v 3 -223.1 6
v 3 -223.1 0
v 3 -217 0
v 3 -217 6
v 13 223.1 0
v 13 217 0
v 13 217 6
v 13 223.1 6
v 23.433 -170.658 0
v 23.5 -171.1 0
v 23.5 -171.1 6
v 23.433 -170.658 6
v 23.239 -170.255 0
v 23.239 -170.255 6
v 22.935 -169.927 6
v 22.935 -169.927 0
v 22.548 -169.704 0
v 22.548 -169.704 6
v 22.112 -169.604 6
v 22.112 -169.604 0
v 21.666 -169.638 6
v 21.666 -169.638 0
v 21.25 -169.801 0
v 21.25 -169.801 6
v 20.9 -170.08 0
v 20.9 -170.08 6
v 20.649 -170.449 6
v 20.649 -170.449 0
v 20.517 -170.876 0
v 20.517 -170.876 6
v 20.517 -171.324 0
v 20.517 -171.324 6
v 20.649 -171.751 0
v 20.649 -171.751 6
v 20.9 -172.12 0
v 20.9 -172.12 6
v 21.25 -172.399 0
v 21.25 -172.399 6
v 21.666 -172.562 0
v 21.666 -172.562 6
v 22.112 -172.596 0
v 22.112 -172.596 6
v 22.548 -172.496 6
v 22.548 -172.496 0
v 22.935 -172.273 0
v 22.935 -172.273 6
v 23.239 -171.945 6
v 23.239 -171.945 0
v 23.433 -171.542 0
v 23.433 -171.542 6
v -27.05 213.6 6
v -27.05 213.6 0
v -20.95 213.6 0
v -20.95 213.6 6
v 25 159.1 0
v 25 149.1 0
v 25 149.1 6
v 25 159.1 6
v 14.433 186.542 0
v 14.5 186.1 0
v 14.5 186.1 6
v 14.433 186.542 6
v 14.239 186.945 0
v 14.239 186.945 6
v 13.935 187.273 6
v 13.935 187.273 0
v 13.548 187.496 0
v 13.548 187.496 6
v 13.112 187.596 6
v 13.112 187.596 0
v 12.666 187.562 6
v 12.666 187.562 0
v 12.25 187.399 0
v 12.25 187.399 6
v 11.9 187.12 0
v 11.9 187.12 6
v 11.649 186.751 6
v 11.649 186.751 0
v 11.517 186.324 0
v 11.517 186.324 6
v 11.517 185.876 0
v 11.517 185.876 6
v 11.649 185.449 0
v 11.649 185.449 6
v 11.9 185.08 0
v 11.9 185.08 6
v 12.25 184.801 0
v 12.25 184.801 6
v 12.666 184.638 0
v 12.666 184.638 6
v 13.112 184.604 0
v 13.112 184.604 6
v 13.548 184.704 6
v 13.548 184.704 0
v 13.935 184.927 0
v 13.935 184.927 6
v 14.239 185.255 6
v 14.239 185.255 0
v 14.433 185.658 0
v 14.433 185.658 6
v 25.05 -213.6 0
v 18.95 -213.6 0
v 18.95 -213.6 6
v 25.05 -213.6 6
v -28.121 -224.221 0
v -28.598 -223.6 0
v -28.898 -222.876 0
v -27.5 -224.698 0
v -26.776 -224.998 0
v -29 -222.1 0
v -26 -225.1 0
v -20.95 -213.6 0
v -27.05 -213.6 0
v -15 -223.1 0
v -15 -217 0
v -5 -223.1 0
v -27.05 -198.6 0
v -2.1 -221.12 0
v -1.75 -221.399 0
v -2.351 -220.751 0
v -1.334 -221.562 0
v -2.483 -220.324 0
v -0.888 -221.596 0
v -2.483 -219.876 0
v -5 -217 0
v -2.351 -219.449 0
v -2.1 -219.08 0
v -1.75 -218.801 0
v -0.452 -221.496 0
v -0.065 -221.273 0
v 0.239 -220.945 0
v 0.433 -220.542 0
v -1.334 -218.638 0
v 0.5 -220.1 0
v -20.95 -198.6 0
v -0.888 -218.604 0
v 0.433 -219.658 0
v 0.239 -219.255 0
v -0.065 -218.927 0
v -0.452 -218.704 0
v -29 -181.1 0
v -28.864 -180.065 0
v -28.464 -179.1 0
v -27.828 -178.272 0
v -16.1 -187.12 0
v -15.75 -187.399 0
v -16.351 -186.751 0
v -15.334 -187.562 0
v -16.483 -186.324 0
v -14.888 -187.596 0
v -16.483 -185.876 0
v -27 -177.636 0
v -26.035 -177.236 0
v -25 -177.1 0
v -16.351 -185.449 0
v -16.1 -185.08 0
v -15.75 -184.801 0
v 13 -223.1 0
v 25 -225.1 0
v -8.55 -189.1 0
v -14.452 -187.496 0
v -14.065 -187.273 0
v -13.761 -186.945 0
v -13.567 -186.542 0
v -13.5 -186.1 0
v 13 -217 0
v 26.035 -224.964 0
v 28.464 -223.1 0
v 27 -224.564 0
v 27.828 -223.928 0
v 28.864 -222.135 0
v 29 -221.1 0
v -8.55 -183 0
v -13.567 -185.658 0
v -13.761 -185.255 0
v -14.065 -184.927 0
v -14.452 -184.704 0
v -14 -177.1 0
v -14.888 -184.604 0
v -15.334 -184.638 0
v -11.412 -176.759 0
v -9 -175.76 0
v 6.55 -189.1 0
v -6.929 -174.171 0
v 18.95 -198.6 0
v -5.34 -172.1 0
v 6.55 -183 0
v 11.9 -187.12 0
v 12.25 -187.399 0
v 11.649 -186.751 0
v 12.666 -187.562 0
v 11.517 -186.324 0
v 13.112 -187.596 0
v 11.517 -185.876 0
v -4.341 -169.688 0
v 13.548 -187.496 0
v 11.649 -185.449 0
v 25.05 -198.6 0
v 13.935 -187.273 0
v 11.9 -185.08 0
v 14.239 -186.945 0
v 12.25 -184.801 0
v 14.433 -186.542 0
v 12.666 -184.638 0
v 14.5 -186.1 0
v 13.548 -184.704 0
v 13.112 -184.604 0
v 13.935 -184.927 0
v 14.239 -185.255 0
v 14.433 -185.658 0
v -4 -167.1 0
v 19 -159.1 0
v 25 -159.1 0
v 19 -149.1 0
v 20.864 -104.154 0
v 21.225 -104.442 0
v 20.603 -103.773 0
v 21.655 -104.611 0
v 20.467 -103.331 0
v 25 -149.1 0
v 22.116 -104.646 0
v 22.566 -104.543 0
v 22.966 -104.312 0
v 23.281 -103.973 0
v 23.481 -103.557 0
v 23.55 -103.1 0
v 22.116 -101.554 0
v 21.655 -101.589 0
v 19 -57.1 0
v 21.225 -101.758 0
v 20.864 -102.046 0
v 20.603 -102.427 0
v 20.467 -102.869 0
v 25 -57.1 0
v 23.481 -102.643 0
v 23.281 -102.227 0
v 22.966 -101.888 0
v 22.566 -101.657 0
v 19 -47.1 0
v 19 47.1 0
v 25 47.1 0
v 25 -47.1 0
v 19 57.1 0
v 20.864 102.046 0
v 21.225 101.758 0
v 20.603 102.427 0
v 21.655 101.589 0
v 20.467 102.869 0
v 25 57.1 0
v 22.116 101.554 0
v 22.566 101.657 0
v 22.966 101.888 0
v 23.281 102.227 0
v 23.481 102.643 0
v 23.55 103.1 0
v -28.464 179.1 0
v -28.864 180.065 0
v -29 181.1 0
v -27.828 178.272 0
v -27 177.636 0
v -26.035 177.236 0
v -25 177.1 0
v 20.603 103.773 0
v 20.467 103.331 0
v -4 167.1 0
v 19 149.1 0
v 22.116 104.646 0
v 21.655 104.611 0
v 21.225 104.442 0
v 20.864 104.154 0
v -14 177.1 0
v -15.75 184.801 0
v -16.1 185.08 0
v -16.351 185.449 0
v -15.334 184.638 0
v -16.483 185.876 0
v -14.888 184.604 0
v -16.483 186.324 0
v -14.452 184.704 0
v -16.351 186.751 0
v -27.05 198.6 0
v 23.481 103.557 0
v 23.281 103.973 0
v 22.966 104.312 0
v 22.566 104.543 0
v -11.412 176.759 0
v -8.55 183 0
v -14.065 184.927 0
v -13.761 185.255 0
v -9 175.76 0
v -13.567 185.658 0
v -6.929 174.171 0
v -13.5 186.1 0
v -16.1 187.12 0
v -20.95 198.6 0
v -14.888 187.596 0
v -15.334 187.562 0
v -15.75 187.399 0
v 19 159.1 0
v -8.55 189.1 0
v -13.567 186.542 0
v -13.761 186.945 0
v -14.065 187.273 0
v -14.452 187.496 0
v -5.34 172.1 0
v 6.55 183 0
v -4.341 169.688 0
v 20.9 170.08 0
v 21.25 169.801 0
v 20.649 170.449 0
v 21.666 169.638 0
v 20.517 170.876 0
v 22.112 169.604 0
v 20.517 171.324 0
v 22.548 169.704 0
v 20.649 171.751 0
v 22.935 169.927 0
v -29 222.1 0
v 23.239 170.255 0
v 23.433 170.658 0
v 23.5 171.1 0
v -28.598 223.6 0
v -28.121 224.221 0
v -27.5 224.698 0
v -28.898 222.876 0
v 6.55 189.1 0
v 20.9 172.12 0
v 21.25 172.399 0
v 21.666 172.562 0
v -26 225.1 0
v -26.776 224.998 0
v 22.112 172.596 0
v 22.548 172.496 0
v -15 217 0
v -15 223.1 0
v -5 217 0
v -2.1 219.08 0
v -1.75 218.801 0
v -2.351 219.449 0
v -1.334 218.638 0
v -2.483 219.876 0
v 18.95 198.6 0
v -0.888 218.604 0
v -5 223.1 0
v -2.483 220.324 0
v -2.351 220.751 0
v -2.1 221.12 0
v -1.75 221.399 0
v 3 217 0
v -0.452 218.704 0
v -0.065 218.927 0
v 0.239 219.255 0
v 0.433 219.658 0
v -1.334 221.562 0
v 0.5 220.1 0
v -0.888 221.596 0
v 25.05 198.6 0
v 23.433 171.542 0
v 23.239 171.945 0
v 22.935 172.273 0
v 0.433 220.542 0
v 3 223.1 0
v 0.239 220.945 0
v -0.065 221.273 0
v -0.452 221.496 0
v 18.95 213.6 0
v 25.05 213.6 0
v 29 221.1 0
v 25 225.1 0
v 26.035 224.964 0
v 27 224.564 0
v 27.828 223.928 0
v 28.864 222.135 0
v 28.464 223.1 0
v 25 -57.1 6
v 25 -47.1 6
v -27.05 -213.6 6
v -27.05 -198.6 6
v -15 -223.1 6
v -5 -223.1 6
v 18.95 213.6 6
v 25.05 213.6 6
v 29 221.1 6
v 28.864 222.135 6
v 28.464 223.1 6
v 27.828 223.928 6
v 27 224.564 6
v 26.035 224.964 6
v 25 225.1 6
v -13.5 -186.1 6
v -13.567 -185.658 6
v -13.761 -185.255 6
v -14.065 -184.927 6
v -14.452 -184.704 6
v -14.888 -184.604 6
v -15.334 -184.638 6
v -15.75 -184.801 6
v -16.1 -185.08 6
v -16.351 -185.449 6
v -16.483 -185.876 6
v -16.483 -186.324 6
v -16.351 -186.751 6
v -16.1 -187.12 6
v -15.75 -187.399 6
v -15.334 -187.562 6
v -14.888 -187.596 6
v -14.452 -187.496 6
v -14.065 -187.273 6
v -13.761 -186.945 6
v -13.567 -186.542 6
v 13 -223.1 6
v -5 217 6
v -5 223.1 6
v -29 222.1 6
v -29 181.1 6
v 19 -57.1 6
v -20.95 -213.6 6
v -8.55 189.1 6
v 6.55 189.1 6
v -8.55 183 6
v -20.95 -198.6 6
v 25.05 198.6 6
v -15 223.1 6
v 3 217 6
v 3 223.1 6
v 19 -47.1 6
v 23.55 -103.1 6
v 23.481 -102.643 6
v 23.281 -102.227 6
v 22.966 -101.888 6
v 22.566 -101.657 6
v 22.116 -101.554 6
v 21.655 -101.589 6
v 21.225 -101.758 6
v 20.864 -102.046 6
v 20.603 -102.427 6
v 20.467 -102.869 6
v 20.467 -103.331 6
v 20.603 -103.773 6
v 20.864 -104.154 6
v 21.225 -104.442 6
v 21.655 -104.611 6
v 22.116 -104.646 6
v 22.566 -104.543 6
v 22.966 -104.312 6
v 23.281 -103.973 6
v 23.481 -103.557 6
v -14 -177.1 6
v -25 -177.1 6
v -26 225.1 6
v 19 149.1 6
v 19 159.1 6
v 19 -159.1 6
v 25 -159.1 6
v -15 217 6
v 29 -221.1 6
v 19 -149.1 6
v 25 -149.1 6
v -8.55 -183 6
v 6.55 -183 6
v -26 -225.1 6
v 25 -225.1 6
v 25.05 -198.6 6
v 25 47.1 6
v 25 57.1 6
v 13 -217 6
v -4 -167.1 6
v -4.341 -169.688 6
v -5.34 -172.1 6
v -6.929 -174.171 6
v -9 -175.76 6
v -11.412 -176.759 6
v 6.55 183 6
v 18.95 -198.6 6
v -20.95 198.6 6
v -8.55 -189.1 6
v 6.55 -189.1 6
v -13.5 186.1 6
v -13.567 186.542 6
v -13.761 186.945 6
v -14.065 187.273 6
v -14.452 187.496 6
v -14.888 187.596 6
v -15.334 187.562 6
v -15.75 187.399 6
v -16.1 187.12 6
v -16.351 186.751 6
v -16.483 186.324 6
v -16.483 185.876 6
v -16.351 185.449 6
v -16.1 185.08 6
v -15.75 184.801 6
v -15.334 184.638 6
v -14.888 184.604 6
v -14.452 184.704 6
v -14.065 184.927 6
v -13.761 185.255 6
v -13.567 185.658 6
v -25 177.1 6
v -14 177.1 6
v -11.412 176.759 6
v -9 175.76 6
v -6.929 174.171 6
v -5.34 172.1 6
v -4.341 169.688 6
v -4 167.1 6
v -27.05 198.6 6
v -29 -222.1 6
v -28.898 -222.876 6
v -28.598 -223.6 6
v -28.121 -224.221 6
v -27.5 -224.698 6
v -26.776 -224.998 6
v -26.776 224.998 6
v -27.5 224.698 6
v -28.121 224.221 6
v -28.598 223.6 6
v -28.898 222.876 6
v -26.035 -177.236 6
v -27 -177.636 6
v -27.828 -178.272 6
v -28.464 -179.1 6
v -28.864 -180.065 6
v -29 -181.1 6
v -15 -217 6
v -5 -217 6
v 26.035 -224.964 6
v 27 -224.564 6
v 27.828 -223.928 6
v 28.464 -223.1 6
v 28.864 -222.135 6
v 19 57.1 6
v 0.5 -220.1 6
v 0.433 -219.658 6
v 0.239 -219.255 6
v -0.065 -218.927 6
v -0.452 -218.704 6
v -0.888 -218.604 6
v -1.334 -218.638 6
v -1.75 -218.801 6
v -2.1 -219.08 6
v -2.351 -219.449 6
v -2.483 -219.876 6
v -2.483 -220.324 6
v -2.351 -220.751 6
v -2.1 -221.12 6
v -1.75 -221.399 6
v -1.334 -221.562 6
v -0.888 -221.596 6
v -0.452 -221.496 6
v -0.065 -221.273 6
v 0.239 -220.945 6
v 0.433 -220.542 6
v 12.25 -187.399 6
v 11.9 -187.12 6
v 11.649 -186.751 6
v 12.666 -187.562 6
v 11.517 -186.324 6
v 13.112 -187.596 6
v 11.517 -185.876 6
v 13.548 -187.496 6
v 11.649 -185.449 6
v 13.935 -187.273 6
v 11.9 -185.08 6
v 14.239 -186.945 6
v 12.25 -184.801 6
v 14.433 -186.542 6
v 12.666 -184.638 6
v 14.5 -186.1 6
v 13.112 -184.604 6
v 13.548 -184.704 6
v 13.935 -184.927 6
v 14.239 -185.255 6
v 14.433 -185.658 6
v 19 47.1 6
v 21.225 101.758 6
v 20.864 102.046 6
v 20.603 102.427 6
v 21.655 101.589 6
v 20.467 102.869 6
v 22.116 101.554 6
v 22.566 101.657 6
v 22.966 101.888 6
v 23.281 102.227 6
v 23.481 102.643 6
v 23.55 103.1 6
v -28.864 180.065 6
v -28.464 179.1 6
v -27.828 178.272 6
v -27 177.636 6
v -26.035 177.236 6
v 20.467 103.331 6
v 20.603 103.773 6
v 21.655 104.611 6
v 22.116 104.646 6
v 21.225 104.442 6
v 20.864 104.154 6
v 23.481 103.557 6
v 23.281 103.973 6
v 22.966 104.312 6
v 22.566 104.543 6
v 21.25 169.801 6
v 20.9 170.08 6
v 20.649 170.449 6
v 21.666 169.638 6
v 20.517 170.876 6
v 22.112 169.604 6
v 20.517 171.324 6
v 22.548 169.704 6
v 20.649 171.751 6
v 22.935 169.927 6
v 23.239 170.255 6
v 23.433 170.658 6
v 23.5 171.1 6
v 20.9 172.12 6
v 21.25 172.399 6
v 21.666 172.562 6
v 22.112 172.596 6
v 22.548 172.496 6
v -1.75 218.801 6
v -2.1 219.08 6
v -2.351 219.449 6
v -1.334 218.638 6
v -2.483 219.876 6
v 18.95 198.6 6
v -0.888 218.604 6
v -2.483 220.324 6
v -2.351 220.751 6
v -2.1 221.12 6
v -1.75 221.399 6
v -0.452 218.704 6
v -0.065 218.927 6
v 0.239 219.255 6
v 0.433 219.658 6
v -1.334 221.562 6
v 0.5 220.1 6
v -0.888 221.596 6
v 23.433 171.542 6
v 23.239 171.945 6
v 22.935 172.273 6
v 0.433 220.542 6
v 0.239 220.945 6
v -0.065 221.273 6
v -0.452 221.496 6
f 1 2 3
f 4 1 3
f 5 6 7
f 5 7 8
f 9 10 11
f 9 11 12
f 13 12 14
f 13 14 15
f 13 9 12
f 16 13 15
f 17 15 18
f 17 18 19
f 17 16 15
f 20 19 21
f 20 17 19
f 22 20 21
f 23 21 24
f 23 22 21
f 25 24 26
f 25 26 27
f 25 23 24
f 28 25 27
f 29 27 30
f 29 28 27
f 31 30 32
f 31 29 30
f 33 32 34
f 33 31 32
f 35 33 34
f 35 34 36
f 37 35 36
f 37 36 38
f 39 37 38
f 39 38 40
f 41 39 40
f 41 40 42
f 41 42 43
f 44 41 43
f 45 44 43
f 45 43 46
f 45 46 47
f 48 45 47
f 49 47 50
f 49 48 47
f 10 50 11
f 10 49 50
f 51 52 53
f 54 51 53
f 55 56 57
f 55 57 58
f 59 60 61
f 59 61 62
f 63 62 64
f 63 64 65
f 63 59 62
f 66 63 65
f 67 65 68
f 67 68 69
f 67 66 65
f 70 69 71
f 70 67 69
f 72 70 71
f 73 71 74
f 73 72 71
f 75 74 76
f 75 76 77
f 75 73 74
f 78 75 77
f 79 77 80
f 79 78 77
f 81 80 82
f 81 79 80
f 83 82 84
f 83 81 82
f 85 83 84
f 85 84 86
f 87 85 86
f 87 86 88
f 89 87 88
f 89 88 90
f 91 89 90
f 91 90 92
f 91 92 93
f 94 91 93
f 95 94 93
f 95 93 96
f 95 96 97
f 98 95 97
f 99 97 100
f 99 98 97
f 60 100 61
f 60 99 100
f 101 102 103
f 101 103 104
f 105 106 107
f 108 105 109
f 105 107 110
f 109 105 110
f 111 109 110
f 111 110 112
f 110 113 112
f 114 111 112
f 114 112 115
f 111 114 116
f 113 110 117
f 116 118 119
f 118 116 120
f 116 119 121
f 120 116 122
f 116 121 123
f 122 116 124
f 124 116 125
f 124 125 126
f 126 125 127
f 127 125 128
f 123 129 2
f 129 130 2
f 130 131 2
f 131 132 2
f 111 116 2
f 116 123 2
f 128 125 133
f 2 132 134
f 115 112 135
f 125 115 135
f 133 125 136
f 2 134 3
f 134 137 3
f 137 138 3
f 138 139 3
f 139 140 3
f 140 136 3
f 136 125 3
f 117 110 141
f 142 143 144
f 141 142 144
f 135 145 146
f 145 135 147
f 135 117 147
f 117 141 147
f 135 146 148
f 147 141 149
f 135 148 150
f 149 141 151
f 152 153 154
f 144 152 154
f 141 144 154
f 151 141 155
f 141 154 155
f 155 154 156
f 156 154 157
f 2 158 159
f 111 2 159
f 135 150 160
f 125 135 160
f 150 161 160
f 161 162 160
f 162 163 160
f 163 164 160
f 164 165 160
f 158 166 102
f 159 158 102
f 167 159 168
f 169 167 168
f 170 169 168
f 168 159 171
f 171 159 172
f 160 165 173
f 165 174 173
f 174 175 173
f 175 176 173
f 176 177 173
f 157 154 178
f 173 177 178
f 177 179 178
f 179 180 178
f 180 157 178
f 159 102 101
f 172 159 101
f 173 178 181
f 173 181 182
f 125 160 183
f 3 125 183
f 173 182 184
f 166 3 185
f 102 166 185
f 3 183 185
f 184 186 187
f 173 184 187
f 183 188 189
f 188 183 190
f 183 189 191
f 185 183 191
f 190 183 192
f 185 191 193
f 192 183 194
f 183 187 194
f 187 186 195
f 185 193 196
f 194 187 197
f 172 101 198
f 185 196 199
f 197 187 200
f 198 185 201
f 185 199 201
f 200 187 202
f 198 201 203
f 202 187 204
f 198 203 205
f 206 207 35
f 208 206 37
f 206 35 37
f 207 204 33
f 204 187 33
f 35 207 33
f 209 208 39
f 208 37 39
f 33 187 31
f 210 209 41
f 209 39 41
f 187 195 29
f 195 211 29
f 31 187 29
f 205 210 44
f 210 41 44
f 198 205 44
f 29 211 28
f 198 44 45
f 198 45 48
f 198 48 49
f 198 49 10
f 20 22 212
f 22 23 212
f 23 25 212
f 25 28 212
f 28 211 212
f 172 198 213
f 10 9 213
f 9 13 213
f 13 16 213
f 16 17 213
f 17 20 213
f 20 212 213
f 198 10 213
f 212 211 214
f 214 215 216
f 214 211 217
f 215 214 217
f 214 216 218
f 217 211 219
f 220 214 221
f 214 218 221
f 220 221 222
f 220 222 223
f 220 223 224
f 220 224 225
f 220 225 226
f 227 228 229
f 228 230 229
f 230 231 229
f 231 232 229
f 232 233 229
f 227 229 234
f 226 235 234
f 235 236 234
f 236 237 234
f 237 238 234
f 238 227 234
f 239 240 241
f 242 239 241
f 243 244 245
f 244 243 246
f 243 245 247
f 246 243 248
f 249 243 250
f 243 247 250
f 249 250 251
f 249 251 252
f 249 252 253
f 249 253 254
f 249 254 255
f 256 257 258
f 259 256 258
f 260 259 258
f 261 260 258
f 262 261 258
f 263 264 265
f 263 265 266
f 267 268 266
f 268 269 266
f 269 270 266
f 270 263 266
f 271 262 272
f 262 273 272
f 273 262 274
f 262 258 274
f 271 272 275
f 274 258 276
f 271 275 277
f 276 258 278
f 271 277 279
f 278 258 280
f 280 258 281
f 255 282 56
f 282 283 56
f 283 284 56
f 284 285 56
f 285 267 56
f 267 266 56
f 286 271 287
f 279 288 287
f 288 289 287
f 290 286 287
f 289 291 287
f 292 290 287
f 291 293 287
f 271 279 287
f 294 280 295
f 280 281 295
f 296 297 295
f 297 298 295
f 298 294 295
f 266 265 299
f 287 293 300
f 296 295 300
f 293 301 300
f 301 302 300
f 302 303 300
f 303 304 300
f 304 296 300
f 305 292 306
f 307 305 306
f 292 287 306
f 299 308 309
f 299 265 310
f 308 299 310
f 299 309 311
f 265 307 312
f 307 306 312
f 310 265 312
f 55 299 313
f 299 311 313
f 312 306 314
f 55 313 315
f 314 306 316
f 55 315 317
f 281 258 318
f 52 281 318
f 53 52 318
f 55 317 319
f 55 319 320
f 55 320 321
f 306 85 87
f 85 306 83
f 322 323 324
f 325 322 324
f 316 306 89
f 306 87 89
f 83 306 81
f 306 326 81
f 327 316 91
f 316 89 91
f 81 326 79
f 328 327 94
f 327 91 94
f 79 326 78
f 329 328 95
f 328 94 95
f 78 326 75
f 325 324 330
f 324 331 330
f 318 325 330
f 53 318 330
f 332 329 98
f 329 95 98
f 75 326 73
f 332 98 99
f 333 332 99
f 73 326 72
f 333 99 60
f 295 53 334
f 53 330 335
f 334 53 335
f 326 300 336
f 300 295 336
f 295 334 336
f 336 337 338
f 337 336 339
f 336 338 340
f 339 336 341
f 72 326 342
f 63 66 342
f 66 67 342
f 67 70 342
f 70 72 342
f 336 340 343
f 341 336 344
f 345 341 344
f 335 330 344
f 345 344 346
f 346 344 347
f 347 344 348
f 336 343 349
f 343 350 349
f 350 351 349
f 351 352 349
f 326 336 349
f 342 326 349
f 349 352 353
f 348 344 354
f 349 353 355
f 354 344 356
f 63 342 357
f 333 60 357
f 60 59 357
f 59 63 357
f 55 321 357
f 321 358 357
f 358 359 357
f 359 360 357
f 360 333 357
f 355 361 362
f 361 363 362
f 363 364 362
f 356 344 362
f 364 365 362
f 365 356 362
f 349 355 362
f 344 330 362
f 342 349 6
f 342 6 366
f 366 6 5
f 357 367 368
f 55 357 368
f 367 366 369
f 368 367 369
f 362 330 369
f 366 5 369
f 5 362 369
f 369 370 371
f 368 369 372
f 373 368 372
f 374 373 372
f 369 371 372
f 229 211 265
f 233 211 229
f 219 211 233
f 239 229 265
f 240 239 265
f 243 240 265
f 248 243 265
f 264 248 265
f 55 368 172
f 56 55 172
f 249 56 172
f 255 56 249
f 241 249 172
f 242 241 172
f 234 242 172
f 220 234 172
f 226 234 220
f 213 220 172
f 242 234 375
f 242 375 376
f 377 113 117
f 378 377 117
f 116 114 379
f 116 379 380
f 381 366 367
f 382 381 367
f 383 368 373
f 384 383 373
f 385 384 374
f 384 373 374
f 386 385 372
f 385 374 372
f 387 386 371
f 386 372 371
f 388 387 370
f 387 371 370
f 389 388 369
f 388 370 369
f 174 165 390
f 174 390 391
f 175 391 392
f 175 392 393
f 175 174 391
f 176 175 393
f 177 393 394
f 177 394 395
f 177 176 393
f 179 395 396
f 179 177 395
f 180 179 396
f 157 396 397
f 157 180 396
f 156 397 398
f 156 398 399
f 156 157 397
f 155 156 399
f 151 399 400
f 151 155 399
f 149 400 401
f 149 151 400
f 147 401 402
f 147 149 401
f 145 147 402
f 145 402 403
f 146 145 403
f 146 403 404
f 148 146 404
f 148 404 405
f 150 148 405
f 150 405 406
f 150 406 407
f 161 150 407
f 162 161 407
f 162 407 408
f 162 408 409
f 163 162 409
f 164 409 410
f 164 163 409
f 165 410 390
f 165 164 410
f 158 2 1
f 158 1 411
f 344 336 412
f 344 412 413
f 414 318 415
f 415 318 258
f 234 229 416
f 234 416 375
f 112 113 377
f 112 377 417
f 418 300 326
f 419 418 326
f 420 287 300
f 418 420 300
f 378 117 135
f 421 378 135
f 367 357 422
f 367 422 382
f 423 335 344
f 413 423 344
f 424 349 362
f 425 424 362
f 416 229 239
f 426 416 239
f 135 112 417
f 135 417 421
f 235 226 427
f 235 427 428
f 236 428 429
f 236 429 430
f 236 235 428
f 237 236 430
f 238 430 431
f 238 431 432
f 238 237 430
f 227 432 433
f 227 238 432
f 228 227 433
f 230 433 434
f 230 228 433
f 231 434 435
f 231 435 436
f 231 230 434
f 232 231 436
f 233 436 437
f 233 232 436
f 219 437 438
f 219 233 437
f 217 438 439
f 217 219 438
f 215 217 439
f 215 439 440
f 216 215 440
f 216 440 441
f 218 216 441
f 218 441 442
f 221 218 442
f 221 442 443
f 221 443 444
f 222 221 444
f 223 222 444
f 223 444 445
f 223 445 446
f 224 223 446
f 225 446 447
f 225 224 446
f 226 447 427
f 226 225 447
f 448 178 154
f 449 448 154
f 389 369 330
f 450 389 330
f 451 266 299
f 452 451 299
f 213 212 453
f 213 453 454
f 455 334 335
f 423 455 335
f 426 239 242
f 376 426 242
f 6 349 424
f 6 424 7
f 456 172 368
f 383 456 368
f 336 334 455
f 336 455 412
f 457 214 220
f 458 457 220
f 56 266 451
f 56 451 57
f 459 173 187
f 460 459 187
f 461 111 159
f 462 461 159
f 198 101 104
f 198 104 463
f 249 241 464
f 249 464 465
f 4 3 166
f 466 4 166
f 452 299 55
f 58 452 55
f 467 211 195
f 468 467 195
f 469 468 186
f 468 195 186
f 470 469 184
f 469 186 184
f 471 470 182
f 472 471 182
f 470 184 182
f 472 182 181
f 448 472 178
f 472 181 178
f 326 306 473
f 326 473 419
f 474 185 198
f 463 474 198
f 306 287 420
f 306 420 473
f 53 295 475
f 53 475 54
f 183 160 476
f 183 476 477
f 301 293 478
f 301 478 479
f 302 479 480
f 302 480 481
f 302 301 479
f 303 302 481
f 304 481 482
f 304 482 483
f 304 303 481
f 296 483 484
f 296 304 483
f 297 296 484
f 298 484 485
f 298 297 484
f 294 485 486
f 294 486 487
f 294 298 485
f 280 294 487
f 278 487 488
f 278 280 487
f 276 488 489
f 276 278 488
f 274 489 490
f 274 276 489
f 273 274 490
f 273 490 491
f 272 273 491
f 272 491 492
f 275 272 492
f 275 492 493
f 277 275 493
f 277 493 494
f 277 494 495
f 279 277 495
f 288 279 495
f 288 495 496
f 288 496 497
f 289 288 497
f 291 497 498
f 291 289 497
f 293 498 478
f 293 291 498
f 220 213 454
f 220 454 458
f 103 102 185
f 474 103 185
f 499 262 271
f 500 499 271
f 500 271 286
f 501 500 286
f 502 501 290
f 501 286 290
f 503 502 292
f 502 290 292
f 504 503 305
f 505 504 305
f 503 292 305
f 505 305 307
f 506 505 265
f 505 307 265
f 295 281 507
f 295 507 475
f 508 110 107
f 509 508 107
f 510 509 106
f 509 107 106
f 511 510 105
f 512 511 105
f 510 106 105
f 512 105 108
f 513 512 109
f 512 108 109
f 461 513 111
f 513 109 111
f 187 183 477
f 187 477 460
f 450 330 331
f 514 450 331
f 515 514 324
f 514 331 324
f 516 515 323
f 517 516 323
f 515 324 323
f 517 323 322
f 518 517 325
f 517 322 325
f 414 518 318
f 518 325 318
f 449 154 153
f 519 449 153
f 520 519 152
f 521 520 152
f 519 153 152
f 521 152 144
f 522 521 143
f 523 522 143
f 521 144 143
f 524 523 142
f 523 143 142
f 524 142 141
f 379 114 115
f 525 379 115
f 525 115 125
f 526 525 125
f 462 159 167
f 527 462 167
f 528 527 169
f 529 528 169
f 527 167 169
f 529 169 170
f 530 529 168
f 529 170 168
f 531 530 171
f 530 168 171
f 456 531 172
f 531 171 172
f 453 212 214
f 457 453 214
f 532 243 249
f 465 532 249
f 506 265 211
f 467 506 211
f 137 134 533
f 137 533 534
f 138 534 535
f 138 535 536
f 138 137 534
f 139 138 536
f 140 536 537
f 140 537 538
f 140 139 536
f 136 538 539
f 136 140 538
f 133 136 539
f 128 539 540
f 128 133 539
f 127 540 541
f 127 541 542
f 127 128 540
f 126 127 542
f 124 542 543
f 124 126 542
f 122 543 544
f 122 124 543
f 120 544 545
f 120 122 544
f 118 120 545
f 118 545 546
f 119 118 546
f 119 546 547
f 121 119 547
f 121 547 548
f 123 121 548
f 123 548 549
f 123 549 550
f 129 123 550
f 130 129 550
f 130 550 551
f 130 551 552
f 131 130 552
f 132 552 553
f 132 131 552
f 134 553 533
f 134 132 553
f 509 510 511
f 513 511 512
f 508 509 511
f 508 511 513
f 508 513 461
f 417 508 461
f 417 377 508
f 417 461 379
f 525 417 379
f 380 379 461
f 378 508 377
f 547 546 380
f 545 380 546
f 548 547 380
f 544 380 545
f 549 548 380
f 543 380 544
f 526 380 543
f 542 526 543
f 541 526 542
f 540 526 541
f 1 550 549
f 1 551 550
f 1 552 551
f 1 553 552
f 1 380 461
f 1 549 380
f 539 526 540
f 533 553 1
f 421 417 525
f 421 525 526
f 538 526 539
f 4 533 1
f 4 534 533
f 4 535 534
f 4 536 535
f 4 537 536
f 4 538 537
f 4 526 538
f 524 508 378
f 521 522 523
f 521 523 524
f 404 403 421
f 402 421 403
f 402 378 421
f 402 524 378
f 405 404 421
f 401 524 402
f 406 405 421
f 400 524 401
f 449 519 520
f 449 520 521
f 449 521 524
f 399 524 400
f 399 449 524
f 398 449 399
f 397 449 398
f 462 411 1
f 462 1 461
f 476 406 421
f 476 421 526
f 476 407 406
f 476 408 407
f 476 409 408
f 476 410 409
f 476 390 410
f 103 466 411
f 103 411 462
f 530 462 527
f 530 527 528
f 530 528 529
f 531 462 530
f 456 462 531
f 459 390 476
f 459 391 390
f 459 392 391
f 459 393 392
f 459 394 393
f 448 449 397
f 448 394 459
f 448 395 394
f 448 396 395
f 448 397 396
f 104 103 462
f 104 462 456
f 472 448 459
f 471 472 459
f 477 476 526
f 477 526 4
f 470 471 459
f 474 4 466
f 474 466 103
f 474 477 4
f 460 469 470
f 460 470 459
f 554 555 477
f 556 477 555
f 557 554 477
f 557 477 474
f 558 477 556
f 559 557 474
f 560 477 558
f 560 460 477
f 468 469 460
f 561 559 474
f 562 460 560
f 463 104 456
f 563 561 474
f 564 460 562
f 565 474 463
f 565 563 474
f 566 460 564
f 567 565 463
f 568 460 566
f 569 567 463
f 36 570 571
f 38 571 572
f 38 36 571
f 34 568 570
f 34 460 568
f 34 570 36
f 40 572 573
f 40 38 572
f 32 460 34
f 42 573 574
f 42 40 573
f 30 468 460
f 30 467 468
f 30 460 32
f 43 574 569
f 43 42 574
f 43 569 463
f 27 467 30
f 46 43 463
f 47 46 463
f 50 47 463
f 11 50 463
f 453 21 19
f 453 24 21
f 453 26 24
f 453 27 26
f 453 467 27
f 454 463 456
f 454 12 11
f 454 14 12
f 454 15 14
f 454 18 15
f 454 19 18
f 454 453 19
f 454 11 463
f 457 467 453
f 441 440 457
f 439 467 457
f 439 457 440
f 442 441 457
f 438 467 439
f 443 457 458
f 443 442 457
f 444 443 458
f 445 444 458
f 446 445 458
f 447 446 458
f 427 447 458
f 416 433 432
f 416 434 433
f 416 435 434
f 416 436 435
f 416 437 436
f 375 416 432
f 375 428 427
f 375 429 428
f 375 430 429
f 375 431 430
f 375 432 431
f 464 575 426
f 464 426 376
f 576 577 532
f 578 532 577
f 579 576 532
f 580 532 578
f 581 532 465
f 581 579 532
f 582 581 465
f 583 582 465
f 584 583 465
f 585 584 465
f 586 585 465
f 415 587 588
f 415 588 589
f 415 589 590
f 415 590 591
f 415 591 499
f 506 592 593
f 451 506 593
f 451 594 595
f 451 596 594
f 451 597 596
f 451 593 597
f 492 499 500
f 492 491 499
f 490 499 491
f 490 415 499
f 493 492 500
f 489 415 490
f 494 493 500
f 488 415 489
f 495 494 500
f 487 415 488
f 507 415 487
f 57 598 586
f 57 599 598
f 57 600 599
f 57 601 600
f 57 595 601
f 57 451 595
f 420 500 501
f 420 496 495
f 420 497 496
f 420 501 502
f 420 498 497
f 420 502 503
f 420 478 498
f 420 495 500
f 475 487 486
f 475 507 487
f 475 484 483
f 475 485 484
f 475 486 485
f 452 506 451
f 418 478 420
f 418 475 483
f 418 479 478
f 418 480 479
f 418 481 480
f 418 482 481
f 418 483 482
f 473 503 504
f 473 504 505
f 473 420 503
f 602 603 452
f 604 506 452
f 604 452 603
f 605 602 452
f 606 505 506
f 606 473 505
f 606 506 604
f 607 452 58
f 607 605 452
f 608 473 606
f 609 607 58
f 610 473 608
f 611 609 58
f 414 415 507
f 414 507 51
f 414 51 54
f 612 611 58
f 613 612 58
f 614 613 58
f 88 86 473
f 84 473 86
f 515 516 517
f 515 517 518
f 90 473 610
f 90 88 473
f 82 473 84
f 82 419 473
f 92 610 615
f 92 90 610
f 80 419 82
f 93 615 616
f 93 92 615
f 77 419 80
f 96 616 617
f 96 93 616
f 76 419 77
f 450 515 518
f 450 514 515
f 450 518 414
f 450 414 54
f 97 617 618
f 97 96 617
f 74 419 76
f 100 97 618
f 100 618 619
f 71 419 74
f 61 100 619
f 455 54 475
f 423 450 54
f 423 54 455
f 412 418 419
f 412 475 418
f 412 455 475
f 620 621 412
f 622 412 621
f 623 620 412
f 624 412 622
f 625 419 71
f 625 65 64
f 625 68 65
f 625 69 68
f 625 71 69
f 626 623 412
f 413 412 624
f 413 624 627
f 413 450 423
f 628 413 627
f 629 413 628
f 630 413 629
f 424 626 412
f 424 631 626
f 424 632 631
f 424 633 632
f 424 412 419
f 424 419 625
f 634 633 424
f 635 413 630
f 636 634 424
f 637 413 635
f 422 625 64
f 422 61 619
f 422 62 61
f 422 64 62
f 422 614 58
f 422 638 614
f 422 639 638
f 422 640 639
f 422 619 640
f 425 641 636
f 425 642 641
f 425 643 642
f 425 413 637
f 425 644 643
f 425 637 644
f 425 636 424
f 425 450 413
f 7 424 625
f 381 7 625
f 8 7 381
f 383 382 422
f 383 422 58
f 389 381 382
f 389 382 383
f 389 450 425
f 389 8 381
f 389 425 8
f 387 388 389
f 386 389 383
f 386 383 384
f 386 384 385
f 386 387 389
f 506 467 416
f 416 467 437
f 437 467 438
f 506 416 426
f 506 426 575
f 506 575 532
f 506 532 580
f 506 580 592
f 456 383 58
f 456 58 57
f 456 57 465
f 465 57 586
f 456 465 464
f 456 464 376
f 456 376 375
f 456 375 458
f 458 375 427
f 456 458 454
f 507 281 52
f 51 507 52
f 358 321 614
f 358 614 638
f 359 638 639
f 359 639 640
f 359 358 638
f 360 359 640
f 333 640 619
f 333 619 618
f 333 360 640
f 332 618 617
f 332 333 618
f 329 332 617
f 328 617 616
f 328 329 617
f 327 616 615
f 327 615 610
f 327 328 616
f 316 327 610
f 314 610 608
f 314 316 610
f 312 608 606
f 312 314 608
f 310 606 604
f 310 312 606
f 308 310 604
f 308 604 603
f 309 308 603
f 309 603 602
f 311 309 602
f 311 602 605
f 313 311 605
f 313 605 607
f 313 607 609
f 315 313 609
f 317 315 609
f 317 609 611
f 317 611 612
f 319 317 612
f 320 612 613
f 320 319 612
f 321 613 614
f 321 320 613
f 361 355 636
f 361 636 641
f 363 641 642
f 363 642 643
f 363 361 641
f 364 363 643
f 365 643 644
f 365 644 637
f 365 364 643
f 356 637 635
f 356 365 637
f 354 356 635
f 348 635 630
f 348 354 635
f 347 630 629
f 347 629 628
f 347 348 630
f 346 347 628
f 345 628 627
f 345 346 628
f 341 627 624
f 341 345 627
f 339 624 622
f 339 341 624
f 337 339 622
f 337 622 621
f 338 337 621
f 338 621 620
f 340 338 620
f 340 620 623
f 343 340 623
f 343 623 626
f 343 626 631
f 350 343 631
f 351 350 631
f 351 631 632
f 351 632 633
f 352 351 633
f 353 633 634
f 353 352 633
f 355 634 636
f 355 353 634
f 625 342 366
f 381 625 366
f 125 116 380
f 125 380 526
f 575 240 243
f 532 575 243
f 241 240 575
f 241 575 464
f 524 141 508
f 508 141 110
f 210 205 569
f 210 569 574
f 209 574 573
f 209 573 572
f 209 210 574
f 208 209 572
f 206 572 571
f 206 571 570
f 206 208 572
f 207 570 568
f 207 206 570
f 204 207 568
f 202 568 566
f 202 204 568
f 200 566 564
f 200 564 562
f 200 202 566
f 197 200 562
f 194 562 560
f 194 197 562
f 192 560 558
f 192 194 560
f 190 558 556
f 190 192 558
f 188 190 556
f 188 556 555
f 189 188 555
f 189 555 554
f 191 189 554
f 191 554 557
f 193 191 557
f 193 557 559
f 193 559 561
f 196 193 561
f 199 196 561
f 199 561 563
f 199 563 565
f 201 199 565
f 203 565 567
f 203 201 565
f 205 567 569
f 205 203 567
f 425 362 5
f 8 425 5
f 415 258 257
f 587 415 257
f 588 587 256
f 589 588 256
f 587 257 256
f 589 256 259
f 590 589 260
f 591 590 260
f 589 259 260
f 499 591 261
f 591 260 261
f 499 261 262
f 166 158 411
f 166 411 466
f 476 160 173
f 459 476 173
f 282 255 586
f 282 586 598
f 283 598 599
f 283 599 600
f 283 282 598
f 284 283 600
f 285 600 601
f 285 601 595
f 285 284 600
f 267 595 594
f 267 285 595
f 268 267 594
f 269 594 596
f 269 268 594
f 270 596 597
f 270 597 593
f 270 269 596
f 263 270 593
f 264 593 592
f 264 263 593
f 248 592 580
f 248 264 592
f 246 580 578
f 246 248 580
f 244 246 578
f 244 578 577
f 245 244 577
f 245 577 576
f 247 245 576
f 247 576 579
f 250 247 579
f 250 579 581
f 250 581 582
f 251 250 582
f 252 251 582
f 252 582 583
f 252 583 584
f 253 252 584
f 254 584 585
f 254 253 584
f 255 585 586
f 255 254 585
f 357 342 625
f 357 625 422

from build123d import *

# Parameters (mm, degrees)
SKETCH_1_R      = 1.5
SKETCH_1_R_2    = 1.55
SKETCH_1_W      = 10
SKETCH_1_H      = 6.1
SKETCH_1_W_2    = 15.1
SKETCH_1_W_3    = 6.1
SKETCH_1_H_2    = 15
SKETCH_1_W_4    = 6
SKETCH_1_H_3    = 10
EXTRUDE_1_DEPTH = 6


with BuildPart() as part:
    # Эскиз1 → Бобышка-Вытянуть1 (new body)
    with BuildSketch(Plane.XY):
        with BuildLine():
            Line((-29, 222.1), (-29, 181.1))
            ThreePointArc((-29, 181.1), (-27.828427125, 178.271572875), (-25, 177.1))
            Line((-25, 177.1), (-14, 177.1))
            ThreePointArc((-14, 177.1), (-6.928932188, 174.171067812), (-4, 167.1))
            Line((-4, 167.1), (-4, -167.1))
            ThreePointArc((-4, -167.1), (-6.928932188, -174.171067812), (-14, -177.1))
            Line((-14, -177.1), (-25, -177.1))
            ThreePointArc((-25, -177.1), (-27.828427125, -178.271572875), (-29, -181.1))
            Line((-29, -181.1), (-29, -222.1))
            ThreePointArc((-29, -222.1), (-28.121320344, -224.221320344), (-26, -225.1))
            Line((-26, -225.1), (25, -225.1))
            ThreePointArc((25, -225.1), (27.828427125, -223.928427125), (29, -221.1))
            Line((29, -221.1), (29, 221.1))
            ThreePointArc((29, 221.1), (27.828427125, 223.928427125), (25, 225.1))
            Line((25, 225.1), (-26, 225.1))
            ThreePointArc((-26, 225.1), (-28.121320344, 224.221320344), (-29, 222.1))
        make_face()
        with Locations((22, 171.1)):
            Circle(SKETCH_1_R, mode=Mode.SUBTRACT)
        with Locations((13, 186.1)):
            Circle(SKETCH_1_R, mode=Mode.SUBTRACT)
        with Locations((-1, 220.1)):
            Circle(SKETCH_1_R, mode=Mode.SUBTRACT)
        with Locations((-15, 186.1)):
            Circle(SKETCH_1_R, mode=Mode.SUBTRACT)
        with Locations((22, 103.1)):
            Circle(SKETCH_1_R_2, mode=Mode.SUBTRACT)
        with Locations((22, -171.1)):
            Circle(SKETCH_1_R, mode=Mode.SUBTRACT)
        with Locations((13, -186.1)):
            Circle(SKETCH_1_R, mode=Mode.SUBTRACT)
        with Locations((-1, -220.1)):
            Circle(SKETCH_1_R, mode=Mode.SUBTRACT)
        with Locations((-15, -186.1)):
            Circle(SKETCH_1_R, mode=Mode.SUBTRACT)
        with Locations((22, -103.1)):
            Circle(SKETCH_1_R_2, mode=Mode.SUBTRACT)
        with Locations((-10, 220.05)):
            Rectangle(SKETCH_1_W, SKETCH_1_H, mode=Mode.SUBTRACT)
        with Locations((-1, 186.05)):
            Rectangle(SKETCH_1_W_2, SKETCH_1_H, mode=Mode.SUBTRACT)
        with Locations((8, 220.05)):
            Rectangle(SKETCH_1_W, SKETCH_1_H, mode=Mode.SUBTRACT)
        with Locations((-24, 206.1)):
            Rectangle(SKETCH_1_W_3, SKETCH_1_H_2, mode=Mode.SUBTRACT)
        with Locations((22, 206.1)):
            Rectangle(SKETCH_1_W_3, SKETCH_1_H_2, mode=Mode.SUBTRACT)
        with Locations((22, 52.1)):
            Rectangle(SKETCH_1_W_4, SKETCH_1_H_3, mode=Mode.SUBTRACT)
        with Locations((22, 154.1)):
            Rectangle(SKETCH_1_W_4, SKETCH_1_H_3, mode=Mode.SUBTRACT)
        with Locations((-10, -220.05)):
            Rectangle(SKETCH_1_W, SKETCH_1_H, mode=Mode.SUBTRACT)
        with Locations((-1, -186.05)):
            Rectangle(SKETCH_1_W_2, SKETCH_1_H, mode=Mode.SUBTRACT)
        with Locations((8, -220.05)):
            Rectangle(SKETCH_1_W, SKETCH_1_H, mode=Mode.SUBTRACT)
        with Locations((-24, -206.1)):
            Rectangle(SKETCH_1_W_3, SKETCH_1_H_2, mode=Mode.SUBTRACT)
        with Locations((22, -206.1)):
            Rectangle(SKETCH_1_W_3, SKETCH_1_H_2, mode=Mode.SUBTRACT)
        with Locations((22, -52.1)):
            Rectangle(SKETCH_1_W_4, SKETCH_1_H_3, mode=Mode.SUBTRACT)
        with Locations((22, -154.1)):
            Rectangle(SKETCH_1_W_4, SKETCH_1_H_3, mode=Mode.SUBTRACT)
    extrude(amount=EXTRUDE_1_DEPTH)


solid = part.part
